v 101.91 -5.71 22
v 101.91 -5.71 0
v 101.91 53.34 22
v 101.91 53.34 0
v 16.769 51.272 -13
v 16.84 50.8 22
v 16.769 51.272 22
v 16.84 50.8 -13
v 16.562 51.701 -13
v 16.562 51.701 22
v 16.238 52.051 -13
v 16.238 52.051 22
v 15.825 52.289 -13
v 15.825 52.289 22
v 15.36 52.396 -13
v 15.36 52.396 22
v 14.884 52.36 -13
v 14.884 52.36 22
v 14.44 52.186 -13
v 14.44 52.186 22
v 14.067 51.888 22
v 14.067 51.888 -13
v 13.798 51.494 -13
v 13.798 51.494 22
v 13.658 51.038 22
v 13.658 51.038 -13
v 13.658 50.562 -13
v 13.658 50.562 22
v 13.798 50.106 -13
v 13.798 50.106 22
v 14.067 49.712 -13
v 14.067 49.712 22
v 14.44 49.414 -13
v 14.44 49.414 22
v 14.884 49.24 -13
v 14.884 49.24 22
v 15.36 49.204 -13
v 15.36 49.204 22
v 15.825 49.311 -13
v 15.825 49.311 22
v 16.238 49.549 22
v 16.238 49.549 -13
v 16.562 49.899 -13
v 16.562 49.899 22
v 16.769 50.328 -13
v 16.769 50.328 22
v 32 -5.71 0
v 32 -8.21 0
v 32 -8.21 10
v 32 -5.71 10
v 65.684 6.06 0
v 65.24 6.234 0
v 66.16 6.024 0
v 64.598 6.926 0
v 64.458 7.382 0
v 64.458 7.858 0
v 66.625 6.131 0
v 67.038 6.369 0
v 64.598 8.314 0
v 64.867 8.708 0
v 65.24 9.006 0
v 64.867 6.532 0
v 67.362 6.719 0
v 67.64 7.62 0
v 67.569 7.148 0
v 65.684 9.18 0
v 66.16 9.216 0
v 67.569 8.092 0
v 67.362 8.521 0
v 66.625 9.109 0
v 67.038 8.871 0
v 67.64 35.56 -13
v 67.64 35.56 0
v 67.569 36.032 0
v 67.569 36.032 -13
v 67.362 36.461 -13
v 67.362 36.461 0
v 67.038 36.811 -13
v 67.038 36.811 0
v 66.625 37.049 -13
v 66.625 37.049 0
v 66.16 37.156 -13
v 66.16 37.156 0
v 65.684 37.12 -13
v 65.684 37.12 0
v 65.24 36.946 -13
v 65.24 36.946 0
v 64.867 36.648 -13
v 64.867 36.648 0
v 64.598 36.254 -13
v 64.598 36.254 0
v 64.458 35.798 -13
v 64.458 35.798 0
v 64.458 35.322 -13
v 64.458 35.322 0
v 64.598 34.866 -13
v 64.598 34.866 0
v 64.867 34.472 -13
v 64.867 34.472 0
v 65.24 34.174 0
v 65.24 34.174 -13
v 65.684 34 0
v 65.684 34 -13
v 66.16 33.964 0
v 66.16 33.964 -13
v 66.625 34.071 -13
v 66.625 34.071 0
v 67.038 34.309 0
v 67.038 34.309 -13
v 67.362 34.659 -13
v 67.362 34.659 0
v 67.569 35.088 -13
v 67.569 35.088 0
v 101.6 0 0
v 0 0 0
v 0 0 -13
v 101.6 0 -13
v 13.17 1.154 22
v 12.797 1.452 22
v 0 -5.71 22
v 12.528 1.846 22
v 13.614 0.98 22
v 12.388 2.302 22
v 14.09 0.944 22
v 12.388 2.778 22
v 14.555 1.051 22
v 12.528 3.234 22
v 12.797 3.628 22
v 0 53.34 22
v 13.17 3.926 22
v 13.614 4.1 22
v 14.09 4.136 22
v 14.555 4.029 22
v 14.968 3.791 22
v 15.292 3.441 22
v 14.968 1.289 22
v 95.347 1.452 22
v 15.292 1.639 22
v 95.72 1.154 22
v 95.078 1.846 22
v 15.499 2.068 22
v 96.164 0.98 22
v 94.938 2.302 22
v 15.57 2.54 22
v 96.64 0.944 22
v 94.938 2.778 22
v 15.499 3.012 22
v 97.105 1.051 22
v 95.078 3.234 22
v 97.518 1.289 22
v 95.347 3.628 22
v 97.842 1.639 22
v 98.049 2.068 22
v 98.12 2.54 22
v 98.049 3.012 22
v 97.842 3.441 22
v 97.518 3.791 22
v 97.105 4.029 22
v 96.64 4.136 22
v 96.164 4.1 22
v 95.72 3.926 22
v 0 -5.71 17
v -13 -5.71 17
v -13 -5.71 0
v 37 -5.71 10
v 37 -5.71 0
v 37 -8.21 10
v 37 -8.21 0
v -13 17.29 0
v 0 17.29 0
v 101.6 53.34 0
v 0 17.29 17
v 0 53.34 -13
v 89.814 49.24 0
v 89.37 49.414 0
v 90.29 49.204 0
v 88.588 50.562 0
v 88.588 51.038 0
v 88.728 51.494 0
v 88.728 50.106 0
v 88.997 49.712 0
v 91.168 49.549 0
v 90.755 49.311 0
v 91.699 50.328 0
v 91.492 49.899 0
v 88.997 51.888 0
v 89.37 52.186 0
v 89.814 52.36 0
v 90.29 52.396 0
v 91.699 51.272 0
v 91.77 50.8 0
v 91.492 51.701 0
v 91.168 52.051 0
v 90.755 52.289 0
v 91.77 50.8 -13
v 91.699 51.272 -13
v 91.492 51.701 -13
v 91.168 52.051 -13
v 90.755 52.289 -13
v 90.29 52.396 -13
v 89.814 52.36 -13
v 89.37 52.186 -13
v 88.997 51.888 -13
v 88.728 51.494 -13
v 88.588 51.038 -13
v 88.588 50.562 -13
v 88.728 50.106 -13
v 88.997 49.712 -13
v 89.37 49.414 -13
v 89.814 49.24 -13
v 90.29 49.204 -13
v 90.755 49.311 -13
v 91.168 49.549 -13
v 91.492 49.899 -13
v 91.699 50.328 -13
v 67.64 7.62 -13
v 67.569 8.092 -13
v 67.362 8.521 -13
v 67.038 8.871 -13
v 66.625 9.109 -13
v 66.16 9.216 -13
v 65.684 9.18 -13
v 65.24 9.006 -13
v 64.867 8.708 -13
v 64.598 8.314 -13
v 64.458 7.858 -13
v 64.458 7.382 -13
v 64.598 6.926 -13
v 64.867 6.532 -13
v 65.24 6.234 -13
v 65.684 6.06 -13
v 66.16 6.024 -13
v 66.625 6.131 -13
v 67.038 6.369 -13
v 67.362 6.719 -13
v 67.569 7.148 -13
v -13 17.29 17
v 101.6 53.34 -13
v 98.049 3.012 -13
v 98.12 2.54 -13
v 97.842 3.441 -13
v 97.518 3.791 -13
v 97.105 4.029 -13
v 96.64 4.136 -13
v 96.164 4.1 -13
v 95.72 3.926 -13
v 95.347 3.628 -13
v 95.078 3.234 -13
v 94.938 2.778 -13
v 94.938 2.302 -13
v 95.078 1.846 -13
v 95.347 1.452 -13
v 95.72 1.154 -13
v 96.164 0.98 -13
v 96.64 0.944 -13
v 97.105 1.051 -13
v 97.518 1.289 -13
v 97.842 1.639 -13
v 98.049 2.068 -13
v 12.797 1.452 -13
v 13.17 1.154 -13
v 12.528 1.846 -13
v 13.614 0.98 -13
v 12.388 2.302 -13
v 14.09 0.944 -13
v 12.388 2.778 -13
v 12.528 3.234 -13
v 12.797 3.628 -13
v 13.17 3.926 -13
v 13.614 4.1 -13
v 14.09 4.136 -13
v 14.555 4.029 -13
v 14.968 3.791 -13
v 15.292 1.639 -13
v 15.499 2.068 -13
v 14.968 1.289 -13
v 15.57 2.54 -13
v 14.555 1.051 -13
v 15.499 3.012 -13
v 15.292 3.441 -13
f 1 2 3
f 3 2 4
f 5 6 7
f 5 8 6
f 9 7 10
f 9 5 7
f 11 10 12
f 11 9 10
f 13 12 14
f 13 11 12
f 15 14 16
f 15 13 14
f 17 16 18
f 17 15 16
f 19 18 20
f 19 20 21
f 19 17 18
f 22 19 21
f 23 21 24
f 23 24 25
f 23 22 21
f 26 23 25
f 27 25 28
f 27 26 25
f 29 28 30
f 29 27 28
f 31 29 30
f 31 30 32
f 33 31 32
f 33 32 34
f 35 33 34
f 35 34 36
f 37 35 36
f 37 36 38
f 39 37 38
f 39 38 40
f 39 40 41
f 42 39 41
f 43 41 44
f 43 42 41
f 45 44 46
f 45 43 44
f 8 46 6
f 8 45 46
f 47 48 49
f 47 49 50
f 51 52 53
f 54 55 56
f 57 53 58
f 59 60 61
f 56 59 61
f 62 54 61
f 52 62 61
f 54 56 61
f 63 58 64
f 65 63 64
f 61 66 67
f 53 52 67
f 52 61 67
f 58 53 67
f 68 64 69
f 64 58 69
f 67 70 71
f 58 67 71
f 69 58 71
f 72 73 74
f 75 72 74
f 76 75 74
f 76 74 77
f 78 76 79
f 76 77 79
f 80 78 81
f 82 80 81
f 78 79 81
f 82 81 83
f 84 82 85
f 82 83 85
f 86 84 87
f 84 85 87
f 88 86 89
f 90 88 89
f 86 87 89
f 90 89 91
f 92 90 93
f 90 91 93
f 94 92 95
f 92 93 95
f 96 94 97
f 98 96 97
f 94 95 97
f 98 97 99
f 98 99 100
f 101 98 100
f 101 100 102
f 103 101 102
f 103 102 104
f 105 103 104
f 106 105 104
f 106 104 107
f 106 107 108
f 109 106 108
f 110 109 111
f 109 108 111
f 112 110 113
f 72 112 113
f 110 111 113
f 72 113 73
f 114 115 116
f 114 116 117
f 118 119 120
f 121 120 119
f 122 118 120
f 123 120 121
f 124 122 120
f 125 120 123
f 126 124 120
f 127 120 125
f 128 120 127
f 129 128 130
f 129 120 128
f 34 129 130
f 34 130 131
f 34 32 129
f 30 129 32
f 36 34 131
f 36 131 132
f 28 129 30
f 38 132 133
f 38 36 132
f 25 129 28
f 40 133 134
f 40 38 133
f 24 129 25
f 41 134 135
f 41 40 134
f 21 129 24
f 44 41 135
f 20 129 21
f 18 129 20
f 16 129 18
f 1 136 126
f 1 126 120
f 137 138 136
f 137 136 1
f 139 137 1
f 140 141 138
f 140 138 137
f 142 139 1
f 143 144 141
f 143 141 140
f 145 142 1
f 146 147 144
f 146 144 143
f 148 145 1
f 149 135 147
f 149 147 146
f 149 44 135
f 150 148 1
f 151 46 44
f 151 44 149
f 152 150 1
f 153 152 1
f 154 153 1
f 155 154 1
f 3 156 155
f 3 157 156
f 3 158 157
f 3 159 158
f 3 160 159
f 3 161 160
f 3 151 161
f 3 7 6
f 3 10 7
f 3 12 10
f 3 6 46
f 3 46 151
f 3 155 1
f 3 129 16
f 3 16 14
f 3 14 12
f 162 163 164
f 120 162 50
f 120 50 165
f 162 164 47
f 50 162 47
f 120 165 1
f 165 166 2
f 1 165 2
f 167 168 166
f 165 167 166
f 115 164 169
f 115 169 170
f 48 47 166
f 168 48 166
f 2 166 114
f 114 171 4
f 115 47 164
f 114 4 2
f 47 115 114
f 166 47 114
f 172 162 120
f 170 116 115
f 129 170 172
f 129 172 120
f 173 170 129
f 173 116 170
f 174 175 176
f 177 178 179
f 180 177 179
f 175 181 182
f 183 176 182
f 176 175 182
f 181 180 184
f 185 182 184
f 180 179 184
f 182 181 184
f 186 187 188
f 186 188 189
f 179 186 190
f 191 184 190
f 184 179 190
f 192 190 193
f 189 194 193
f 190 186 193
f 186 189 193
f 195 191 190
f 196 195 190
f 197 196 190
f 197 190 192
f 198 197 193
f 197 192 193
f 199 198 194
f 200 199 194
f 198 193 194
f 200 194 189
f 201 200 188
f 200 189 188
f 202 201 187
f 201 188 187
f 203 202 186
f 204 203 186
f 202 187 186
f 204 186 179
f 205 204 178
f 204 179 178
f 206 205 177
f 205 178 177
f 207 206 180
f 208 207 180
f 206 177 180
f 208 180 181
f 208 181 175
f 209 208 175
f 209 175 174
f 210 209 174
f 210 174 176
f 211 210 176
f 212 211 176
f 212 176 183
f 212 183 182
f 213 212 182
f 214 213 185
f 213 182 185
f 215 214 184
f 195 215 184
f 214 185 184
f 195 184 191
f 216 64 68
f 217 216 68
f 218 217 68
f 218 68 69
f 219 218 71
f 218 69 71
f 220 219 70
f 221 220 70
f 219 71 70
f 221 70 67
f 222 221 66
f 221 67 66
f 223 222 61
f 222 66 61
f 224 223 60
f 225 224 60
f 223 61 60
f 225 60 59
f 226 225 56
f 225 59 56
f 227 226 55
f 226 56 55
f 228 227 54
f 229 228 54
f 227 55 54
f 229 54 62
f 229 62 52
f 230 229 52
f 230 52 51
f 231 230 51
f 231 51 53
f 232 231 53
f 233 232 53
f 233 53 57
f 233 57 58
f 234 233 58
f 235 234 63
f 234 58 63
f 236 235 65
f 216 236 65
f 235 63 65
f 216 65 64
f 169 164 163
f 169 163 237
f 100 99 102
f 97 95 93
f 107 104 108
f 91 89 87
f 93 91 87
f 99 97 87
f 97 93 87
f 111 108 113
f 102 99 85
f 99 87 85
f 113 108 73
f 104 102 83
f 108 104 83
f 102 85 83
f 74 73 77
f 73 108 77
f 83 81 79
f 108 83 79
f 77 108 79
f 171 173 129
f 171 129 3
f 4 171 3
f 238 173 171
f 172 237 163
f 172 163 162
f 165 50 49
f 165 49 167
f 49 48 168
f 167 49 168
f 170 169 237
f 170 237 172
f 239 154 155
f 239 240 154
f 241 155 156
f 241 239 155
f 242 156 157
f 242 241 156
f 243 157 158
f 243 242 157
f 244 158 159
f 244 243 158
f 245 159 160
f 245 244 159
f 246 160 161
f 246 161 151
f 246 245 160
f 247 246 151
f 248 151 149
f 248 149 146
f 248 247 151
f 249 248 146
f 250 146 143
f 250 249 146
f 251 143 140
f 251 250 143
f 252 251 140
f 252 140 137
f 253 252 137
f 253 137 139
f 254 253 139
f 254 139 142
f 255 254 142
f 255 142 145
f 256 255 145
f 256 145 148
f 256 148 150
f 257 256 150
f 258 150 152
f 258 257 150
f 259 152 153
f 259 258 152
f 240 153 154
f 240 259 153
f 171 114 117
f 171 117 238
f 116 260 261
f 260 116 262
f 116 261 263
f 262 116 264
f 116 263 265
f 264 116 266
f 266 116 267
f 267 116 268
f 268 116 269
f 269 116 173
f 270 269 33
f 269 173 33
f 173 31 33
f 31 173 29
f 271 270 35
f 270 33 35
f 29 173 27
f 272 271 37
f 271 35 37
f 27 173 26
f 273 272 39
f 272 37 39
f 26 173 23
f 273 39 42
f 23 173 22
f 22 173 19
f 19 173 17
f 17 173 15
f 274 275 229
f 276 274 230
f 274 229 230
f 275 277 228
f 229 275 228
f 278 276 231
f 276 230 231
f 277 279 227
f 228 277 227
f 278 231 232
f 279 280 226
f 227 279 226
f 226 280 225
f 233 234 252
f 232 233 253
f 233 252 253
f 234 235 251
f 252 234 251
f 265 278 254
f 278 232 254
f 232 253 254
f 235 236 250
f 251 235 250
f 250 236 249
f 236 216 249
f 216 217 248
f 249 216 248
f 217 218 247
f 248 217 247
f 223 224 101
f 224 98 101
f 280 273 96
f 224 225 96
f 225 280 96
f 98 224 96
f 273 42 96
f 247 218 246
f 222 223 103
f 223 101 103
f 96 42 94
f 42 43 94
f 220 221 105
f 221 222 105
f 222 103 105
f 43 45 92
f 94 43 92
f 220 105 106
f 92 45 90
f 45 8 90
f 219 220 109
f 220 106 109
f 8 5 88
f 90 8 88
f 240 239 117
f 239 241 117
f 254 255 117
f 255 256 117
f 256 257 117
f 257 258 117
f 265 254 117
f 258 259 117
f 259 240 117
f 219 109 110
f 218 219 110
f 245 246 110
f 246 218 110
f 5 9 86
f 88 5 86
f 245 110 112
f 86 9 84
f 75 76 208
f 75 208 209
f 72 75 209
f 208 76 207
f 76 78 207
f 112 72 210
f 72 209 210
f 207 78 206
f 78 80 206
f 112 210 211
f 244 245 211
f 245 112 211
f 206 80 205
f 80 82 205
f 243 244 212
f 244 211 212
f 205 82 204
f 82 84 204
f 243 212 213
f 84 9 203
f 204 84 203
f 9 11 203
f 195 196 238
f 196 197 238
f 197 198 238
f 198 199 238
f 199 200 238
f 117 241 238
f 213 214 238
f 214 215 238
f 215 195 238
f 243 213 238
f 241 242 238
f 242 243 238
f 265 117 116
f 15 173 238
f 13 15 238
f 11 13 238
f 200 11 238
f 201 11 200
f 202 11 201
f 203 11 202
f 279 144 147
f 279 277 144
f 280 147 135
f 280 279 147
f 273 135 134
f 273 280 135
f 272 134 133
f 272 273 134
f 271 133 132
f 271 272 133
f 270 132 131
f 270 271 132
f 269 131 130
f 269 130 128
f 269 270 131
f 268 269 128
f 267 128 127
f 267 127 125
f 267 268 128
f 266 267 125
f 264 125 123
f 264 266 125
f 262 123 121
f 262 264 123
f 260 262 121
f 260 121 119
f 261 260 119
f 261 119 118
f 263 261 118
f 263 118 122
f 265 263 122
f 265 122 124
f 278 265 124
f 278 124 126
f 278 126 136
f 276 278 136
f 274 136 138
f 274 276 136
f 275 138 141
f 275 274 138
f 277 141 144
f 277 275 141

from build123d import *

# Parameters (mm, degrees)
SKETCH_W     = 101.6
SKETCH_H     = 53.34
SKETCH_R     = 1.6
PAD_DEPTH    = 13
SKETCH001_W  = 101.91
SKETCH001_H  = 59.05
SKETCH001_R  = 1.6
PAD001_DEPTH = 22
SKETCH002_W  = 13
SKETCH002_H  = 23
PAD002_DEPTH = 17
SKETCH003_W  = 5
SKETCH003_H  = 2.5
PAD003_DEPTH = 10


with BuildPart() as part:
    # Sketch → Pad (new body)
    with BuildSketch(Plane.XY):
        with Locations((50.8, 26.67)):
            Rectangle(SKETCH_W, SKETCH_H)
        with Locations((13.97, 2.54)):
            Circle(SKETCH_R, mode=Mode.SUBTRACT)
        with Locations((15.24, 50.8)):
            Circle(SKETCH_R, mode=Mode.SUBTRACT)
        with Locations((90.17, 50.8)):
            Circle(SKETCH_R, mode=Mode.SUBTRACT)
        with Locations((96.52, 2.54)):
            Circle(SKETCH_R, mode=Mode.SUBTRACT)
        with Locations((66.04, 35.56)):
            Circle(SKETCH_R, mode=Mode.SUBTRACT)
        with Locations((66.04, 7.62)):
            Circle(SKETCH_R, mode=Mode.SUBTRACT)
    extrude(amount=-PAD_DEPTH)

    # Sketch001 (on DatumPlane) → Pad001 (join)
    with BuildSketch(Plane(origin=(0, -5.71, 0), x_dir=(1, 0, 0), z_dir=(0, 0, 1))):
        with Locations((50.955, 29.525)):
            Rectangle(SKETCH001_W, SKETCH001_H)
        with Locations((13.97, 8.25)):
            Circle(SKETCH001_R, mode=Mode.SUBTRACT)
        with Locations((15.24, 56.51)):
            Circle(SKETCH001_R, mode=Mode.SUBTRACT)
        with Locations((96.52, 8.25)):
            Circle(SKETCH001_R, mode=Mode.SUBTRACT)
    extrude(amount=PAD001_DEPTH)

    # Sketch002 (on DatumPlane) → Pad002 (join)
    with BuildSketch(Plane(origin=(0, -5.71, 0), x_dir=(1, 0, 0), z_dir=(0, 0, 1))):
        with Locations((-6.5, 11.5)):
            Rectangle(SKETCH002_W, SKETCH002_H)
    extrude(amount=PAD002_DEPTH)

    # Sketch003 (on DatumPlane) → Pad003 (join)
    with BuildSketch(Plane(origin=(0, -5.71, 0), x_dir=(1, 0, 0), z_dir=(0, 0, 1))):
        with Locations((34.5, -1.25)):
            Rectangle(SKETCH003_W, SKETCH003_H)
    extrude(amount=PAD003_DEPTH)


solid = part.part
